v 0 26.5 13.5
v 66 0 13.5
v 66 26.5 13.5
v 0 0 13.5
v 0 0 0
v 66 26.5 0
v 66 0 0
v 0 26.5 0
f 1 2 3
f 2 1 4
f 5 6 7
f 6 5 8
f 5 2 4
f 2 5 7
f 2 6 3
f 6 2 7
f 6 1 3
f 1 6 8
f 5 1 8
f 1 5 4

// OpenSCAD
$fn=100;

module battery(){
     cube([66,26.5,13.5]);
}

module support_batterie(){

     difference(){
	  union(){
	       cube([56,85.5,10]);
	       minkowski(){
	       translate([(56-30)/2,85,0])cube([30,7,2]);
	       cylinder(d=2,h=0.01);
	       }
	       translate([0,-2,0])cube([17,2,10]);
	       translate([27,-2,0])cube([29,2,10]);
	  }
	  translate([2,-0.1,2])cube([52,85.7,8.1]);
     }

}

battery();
